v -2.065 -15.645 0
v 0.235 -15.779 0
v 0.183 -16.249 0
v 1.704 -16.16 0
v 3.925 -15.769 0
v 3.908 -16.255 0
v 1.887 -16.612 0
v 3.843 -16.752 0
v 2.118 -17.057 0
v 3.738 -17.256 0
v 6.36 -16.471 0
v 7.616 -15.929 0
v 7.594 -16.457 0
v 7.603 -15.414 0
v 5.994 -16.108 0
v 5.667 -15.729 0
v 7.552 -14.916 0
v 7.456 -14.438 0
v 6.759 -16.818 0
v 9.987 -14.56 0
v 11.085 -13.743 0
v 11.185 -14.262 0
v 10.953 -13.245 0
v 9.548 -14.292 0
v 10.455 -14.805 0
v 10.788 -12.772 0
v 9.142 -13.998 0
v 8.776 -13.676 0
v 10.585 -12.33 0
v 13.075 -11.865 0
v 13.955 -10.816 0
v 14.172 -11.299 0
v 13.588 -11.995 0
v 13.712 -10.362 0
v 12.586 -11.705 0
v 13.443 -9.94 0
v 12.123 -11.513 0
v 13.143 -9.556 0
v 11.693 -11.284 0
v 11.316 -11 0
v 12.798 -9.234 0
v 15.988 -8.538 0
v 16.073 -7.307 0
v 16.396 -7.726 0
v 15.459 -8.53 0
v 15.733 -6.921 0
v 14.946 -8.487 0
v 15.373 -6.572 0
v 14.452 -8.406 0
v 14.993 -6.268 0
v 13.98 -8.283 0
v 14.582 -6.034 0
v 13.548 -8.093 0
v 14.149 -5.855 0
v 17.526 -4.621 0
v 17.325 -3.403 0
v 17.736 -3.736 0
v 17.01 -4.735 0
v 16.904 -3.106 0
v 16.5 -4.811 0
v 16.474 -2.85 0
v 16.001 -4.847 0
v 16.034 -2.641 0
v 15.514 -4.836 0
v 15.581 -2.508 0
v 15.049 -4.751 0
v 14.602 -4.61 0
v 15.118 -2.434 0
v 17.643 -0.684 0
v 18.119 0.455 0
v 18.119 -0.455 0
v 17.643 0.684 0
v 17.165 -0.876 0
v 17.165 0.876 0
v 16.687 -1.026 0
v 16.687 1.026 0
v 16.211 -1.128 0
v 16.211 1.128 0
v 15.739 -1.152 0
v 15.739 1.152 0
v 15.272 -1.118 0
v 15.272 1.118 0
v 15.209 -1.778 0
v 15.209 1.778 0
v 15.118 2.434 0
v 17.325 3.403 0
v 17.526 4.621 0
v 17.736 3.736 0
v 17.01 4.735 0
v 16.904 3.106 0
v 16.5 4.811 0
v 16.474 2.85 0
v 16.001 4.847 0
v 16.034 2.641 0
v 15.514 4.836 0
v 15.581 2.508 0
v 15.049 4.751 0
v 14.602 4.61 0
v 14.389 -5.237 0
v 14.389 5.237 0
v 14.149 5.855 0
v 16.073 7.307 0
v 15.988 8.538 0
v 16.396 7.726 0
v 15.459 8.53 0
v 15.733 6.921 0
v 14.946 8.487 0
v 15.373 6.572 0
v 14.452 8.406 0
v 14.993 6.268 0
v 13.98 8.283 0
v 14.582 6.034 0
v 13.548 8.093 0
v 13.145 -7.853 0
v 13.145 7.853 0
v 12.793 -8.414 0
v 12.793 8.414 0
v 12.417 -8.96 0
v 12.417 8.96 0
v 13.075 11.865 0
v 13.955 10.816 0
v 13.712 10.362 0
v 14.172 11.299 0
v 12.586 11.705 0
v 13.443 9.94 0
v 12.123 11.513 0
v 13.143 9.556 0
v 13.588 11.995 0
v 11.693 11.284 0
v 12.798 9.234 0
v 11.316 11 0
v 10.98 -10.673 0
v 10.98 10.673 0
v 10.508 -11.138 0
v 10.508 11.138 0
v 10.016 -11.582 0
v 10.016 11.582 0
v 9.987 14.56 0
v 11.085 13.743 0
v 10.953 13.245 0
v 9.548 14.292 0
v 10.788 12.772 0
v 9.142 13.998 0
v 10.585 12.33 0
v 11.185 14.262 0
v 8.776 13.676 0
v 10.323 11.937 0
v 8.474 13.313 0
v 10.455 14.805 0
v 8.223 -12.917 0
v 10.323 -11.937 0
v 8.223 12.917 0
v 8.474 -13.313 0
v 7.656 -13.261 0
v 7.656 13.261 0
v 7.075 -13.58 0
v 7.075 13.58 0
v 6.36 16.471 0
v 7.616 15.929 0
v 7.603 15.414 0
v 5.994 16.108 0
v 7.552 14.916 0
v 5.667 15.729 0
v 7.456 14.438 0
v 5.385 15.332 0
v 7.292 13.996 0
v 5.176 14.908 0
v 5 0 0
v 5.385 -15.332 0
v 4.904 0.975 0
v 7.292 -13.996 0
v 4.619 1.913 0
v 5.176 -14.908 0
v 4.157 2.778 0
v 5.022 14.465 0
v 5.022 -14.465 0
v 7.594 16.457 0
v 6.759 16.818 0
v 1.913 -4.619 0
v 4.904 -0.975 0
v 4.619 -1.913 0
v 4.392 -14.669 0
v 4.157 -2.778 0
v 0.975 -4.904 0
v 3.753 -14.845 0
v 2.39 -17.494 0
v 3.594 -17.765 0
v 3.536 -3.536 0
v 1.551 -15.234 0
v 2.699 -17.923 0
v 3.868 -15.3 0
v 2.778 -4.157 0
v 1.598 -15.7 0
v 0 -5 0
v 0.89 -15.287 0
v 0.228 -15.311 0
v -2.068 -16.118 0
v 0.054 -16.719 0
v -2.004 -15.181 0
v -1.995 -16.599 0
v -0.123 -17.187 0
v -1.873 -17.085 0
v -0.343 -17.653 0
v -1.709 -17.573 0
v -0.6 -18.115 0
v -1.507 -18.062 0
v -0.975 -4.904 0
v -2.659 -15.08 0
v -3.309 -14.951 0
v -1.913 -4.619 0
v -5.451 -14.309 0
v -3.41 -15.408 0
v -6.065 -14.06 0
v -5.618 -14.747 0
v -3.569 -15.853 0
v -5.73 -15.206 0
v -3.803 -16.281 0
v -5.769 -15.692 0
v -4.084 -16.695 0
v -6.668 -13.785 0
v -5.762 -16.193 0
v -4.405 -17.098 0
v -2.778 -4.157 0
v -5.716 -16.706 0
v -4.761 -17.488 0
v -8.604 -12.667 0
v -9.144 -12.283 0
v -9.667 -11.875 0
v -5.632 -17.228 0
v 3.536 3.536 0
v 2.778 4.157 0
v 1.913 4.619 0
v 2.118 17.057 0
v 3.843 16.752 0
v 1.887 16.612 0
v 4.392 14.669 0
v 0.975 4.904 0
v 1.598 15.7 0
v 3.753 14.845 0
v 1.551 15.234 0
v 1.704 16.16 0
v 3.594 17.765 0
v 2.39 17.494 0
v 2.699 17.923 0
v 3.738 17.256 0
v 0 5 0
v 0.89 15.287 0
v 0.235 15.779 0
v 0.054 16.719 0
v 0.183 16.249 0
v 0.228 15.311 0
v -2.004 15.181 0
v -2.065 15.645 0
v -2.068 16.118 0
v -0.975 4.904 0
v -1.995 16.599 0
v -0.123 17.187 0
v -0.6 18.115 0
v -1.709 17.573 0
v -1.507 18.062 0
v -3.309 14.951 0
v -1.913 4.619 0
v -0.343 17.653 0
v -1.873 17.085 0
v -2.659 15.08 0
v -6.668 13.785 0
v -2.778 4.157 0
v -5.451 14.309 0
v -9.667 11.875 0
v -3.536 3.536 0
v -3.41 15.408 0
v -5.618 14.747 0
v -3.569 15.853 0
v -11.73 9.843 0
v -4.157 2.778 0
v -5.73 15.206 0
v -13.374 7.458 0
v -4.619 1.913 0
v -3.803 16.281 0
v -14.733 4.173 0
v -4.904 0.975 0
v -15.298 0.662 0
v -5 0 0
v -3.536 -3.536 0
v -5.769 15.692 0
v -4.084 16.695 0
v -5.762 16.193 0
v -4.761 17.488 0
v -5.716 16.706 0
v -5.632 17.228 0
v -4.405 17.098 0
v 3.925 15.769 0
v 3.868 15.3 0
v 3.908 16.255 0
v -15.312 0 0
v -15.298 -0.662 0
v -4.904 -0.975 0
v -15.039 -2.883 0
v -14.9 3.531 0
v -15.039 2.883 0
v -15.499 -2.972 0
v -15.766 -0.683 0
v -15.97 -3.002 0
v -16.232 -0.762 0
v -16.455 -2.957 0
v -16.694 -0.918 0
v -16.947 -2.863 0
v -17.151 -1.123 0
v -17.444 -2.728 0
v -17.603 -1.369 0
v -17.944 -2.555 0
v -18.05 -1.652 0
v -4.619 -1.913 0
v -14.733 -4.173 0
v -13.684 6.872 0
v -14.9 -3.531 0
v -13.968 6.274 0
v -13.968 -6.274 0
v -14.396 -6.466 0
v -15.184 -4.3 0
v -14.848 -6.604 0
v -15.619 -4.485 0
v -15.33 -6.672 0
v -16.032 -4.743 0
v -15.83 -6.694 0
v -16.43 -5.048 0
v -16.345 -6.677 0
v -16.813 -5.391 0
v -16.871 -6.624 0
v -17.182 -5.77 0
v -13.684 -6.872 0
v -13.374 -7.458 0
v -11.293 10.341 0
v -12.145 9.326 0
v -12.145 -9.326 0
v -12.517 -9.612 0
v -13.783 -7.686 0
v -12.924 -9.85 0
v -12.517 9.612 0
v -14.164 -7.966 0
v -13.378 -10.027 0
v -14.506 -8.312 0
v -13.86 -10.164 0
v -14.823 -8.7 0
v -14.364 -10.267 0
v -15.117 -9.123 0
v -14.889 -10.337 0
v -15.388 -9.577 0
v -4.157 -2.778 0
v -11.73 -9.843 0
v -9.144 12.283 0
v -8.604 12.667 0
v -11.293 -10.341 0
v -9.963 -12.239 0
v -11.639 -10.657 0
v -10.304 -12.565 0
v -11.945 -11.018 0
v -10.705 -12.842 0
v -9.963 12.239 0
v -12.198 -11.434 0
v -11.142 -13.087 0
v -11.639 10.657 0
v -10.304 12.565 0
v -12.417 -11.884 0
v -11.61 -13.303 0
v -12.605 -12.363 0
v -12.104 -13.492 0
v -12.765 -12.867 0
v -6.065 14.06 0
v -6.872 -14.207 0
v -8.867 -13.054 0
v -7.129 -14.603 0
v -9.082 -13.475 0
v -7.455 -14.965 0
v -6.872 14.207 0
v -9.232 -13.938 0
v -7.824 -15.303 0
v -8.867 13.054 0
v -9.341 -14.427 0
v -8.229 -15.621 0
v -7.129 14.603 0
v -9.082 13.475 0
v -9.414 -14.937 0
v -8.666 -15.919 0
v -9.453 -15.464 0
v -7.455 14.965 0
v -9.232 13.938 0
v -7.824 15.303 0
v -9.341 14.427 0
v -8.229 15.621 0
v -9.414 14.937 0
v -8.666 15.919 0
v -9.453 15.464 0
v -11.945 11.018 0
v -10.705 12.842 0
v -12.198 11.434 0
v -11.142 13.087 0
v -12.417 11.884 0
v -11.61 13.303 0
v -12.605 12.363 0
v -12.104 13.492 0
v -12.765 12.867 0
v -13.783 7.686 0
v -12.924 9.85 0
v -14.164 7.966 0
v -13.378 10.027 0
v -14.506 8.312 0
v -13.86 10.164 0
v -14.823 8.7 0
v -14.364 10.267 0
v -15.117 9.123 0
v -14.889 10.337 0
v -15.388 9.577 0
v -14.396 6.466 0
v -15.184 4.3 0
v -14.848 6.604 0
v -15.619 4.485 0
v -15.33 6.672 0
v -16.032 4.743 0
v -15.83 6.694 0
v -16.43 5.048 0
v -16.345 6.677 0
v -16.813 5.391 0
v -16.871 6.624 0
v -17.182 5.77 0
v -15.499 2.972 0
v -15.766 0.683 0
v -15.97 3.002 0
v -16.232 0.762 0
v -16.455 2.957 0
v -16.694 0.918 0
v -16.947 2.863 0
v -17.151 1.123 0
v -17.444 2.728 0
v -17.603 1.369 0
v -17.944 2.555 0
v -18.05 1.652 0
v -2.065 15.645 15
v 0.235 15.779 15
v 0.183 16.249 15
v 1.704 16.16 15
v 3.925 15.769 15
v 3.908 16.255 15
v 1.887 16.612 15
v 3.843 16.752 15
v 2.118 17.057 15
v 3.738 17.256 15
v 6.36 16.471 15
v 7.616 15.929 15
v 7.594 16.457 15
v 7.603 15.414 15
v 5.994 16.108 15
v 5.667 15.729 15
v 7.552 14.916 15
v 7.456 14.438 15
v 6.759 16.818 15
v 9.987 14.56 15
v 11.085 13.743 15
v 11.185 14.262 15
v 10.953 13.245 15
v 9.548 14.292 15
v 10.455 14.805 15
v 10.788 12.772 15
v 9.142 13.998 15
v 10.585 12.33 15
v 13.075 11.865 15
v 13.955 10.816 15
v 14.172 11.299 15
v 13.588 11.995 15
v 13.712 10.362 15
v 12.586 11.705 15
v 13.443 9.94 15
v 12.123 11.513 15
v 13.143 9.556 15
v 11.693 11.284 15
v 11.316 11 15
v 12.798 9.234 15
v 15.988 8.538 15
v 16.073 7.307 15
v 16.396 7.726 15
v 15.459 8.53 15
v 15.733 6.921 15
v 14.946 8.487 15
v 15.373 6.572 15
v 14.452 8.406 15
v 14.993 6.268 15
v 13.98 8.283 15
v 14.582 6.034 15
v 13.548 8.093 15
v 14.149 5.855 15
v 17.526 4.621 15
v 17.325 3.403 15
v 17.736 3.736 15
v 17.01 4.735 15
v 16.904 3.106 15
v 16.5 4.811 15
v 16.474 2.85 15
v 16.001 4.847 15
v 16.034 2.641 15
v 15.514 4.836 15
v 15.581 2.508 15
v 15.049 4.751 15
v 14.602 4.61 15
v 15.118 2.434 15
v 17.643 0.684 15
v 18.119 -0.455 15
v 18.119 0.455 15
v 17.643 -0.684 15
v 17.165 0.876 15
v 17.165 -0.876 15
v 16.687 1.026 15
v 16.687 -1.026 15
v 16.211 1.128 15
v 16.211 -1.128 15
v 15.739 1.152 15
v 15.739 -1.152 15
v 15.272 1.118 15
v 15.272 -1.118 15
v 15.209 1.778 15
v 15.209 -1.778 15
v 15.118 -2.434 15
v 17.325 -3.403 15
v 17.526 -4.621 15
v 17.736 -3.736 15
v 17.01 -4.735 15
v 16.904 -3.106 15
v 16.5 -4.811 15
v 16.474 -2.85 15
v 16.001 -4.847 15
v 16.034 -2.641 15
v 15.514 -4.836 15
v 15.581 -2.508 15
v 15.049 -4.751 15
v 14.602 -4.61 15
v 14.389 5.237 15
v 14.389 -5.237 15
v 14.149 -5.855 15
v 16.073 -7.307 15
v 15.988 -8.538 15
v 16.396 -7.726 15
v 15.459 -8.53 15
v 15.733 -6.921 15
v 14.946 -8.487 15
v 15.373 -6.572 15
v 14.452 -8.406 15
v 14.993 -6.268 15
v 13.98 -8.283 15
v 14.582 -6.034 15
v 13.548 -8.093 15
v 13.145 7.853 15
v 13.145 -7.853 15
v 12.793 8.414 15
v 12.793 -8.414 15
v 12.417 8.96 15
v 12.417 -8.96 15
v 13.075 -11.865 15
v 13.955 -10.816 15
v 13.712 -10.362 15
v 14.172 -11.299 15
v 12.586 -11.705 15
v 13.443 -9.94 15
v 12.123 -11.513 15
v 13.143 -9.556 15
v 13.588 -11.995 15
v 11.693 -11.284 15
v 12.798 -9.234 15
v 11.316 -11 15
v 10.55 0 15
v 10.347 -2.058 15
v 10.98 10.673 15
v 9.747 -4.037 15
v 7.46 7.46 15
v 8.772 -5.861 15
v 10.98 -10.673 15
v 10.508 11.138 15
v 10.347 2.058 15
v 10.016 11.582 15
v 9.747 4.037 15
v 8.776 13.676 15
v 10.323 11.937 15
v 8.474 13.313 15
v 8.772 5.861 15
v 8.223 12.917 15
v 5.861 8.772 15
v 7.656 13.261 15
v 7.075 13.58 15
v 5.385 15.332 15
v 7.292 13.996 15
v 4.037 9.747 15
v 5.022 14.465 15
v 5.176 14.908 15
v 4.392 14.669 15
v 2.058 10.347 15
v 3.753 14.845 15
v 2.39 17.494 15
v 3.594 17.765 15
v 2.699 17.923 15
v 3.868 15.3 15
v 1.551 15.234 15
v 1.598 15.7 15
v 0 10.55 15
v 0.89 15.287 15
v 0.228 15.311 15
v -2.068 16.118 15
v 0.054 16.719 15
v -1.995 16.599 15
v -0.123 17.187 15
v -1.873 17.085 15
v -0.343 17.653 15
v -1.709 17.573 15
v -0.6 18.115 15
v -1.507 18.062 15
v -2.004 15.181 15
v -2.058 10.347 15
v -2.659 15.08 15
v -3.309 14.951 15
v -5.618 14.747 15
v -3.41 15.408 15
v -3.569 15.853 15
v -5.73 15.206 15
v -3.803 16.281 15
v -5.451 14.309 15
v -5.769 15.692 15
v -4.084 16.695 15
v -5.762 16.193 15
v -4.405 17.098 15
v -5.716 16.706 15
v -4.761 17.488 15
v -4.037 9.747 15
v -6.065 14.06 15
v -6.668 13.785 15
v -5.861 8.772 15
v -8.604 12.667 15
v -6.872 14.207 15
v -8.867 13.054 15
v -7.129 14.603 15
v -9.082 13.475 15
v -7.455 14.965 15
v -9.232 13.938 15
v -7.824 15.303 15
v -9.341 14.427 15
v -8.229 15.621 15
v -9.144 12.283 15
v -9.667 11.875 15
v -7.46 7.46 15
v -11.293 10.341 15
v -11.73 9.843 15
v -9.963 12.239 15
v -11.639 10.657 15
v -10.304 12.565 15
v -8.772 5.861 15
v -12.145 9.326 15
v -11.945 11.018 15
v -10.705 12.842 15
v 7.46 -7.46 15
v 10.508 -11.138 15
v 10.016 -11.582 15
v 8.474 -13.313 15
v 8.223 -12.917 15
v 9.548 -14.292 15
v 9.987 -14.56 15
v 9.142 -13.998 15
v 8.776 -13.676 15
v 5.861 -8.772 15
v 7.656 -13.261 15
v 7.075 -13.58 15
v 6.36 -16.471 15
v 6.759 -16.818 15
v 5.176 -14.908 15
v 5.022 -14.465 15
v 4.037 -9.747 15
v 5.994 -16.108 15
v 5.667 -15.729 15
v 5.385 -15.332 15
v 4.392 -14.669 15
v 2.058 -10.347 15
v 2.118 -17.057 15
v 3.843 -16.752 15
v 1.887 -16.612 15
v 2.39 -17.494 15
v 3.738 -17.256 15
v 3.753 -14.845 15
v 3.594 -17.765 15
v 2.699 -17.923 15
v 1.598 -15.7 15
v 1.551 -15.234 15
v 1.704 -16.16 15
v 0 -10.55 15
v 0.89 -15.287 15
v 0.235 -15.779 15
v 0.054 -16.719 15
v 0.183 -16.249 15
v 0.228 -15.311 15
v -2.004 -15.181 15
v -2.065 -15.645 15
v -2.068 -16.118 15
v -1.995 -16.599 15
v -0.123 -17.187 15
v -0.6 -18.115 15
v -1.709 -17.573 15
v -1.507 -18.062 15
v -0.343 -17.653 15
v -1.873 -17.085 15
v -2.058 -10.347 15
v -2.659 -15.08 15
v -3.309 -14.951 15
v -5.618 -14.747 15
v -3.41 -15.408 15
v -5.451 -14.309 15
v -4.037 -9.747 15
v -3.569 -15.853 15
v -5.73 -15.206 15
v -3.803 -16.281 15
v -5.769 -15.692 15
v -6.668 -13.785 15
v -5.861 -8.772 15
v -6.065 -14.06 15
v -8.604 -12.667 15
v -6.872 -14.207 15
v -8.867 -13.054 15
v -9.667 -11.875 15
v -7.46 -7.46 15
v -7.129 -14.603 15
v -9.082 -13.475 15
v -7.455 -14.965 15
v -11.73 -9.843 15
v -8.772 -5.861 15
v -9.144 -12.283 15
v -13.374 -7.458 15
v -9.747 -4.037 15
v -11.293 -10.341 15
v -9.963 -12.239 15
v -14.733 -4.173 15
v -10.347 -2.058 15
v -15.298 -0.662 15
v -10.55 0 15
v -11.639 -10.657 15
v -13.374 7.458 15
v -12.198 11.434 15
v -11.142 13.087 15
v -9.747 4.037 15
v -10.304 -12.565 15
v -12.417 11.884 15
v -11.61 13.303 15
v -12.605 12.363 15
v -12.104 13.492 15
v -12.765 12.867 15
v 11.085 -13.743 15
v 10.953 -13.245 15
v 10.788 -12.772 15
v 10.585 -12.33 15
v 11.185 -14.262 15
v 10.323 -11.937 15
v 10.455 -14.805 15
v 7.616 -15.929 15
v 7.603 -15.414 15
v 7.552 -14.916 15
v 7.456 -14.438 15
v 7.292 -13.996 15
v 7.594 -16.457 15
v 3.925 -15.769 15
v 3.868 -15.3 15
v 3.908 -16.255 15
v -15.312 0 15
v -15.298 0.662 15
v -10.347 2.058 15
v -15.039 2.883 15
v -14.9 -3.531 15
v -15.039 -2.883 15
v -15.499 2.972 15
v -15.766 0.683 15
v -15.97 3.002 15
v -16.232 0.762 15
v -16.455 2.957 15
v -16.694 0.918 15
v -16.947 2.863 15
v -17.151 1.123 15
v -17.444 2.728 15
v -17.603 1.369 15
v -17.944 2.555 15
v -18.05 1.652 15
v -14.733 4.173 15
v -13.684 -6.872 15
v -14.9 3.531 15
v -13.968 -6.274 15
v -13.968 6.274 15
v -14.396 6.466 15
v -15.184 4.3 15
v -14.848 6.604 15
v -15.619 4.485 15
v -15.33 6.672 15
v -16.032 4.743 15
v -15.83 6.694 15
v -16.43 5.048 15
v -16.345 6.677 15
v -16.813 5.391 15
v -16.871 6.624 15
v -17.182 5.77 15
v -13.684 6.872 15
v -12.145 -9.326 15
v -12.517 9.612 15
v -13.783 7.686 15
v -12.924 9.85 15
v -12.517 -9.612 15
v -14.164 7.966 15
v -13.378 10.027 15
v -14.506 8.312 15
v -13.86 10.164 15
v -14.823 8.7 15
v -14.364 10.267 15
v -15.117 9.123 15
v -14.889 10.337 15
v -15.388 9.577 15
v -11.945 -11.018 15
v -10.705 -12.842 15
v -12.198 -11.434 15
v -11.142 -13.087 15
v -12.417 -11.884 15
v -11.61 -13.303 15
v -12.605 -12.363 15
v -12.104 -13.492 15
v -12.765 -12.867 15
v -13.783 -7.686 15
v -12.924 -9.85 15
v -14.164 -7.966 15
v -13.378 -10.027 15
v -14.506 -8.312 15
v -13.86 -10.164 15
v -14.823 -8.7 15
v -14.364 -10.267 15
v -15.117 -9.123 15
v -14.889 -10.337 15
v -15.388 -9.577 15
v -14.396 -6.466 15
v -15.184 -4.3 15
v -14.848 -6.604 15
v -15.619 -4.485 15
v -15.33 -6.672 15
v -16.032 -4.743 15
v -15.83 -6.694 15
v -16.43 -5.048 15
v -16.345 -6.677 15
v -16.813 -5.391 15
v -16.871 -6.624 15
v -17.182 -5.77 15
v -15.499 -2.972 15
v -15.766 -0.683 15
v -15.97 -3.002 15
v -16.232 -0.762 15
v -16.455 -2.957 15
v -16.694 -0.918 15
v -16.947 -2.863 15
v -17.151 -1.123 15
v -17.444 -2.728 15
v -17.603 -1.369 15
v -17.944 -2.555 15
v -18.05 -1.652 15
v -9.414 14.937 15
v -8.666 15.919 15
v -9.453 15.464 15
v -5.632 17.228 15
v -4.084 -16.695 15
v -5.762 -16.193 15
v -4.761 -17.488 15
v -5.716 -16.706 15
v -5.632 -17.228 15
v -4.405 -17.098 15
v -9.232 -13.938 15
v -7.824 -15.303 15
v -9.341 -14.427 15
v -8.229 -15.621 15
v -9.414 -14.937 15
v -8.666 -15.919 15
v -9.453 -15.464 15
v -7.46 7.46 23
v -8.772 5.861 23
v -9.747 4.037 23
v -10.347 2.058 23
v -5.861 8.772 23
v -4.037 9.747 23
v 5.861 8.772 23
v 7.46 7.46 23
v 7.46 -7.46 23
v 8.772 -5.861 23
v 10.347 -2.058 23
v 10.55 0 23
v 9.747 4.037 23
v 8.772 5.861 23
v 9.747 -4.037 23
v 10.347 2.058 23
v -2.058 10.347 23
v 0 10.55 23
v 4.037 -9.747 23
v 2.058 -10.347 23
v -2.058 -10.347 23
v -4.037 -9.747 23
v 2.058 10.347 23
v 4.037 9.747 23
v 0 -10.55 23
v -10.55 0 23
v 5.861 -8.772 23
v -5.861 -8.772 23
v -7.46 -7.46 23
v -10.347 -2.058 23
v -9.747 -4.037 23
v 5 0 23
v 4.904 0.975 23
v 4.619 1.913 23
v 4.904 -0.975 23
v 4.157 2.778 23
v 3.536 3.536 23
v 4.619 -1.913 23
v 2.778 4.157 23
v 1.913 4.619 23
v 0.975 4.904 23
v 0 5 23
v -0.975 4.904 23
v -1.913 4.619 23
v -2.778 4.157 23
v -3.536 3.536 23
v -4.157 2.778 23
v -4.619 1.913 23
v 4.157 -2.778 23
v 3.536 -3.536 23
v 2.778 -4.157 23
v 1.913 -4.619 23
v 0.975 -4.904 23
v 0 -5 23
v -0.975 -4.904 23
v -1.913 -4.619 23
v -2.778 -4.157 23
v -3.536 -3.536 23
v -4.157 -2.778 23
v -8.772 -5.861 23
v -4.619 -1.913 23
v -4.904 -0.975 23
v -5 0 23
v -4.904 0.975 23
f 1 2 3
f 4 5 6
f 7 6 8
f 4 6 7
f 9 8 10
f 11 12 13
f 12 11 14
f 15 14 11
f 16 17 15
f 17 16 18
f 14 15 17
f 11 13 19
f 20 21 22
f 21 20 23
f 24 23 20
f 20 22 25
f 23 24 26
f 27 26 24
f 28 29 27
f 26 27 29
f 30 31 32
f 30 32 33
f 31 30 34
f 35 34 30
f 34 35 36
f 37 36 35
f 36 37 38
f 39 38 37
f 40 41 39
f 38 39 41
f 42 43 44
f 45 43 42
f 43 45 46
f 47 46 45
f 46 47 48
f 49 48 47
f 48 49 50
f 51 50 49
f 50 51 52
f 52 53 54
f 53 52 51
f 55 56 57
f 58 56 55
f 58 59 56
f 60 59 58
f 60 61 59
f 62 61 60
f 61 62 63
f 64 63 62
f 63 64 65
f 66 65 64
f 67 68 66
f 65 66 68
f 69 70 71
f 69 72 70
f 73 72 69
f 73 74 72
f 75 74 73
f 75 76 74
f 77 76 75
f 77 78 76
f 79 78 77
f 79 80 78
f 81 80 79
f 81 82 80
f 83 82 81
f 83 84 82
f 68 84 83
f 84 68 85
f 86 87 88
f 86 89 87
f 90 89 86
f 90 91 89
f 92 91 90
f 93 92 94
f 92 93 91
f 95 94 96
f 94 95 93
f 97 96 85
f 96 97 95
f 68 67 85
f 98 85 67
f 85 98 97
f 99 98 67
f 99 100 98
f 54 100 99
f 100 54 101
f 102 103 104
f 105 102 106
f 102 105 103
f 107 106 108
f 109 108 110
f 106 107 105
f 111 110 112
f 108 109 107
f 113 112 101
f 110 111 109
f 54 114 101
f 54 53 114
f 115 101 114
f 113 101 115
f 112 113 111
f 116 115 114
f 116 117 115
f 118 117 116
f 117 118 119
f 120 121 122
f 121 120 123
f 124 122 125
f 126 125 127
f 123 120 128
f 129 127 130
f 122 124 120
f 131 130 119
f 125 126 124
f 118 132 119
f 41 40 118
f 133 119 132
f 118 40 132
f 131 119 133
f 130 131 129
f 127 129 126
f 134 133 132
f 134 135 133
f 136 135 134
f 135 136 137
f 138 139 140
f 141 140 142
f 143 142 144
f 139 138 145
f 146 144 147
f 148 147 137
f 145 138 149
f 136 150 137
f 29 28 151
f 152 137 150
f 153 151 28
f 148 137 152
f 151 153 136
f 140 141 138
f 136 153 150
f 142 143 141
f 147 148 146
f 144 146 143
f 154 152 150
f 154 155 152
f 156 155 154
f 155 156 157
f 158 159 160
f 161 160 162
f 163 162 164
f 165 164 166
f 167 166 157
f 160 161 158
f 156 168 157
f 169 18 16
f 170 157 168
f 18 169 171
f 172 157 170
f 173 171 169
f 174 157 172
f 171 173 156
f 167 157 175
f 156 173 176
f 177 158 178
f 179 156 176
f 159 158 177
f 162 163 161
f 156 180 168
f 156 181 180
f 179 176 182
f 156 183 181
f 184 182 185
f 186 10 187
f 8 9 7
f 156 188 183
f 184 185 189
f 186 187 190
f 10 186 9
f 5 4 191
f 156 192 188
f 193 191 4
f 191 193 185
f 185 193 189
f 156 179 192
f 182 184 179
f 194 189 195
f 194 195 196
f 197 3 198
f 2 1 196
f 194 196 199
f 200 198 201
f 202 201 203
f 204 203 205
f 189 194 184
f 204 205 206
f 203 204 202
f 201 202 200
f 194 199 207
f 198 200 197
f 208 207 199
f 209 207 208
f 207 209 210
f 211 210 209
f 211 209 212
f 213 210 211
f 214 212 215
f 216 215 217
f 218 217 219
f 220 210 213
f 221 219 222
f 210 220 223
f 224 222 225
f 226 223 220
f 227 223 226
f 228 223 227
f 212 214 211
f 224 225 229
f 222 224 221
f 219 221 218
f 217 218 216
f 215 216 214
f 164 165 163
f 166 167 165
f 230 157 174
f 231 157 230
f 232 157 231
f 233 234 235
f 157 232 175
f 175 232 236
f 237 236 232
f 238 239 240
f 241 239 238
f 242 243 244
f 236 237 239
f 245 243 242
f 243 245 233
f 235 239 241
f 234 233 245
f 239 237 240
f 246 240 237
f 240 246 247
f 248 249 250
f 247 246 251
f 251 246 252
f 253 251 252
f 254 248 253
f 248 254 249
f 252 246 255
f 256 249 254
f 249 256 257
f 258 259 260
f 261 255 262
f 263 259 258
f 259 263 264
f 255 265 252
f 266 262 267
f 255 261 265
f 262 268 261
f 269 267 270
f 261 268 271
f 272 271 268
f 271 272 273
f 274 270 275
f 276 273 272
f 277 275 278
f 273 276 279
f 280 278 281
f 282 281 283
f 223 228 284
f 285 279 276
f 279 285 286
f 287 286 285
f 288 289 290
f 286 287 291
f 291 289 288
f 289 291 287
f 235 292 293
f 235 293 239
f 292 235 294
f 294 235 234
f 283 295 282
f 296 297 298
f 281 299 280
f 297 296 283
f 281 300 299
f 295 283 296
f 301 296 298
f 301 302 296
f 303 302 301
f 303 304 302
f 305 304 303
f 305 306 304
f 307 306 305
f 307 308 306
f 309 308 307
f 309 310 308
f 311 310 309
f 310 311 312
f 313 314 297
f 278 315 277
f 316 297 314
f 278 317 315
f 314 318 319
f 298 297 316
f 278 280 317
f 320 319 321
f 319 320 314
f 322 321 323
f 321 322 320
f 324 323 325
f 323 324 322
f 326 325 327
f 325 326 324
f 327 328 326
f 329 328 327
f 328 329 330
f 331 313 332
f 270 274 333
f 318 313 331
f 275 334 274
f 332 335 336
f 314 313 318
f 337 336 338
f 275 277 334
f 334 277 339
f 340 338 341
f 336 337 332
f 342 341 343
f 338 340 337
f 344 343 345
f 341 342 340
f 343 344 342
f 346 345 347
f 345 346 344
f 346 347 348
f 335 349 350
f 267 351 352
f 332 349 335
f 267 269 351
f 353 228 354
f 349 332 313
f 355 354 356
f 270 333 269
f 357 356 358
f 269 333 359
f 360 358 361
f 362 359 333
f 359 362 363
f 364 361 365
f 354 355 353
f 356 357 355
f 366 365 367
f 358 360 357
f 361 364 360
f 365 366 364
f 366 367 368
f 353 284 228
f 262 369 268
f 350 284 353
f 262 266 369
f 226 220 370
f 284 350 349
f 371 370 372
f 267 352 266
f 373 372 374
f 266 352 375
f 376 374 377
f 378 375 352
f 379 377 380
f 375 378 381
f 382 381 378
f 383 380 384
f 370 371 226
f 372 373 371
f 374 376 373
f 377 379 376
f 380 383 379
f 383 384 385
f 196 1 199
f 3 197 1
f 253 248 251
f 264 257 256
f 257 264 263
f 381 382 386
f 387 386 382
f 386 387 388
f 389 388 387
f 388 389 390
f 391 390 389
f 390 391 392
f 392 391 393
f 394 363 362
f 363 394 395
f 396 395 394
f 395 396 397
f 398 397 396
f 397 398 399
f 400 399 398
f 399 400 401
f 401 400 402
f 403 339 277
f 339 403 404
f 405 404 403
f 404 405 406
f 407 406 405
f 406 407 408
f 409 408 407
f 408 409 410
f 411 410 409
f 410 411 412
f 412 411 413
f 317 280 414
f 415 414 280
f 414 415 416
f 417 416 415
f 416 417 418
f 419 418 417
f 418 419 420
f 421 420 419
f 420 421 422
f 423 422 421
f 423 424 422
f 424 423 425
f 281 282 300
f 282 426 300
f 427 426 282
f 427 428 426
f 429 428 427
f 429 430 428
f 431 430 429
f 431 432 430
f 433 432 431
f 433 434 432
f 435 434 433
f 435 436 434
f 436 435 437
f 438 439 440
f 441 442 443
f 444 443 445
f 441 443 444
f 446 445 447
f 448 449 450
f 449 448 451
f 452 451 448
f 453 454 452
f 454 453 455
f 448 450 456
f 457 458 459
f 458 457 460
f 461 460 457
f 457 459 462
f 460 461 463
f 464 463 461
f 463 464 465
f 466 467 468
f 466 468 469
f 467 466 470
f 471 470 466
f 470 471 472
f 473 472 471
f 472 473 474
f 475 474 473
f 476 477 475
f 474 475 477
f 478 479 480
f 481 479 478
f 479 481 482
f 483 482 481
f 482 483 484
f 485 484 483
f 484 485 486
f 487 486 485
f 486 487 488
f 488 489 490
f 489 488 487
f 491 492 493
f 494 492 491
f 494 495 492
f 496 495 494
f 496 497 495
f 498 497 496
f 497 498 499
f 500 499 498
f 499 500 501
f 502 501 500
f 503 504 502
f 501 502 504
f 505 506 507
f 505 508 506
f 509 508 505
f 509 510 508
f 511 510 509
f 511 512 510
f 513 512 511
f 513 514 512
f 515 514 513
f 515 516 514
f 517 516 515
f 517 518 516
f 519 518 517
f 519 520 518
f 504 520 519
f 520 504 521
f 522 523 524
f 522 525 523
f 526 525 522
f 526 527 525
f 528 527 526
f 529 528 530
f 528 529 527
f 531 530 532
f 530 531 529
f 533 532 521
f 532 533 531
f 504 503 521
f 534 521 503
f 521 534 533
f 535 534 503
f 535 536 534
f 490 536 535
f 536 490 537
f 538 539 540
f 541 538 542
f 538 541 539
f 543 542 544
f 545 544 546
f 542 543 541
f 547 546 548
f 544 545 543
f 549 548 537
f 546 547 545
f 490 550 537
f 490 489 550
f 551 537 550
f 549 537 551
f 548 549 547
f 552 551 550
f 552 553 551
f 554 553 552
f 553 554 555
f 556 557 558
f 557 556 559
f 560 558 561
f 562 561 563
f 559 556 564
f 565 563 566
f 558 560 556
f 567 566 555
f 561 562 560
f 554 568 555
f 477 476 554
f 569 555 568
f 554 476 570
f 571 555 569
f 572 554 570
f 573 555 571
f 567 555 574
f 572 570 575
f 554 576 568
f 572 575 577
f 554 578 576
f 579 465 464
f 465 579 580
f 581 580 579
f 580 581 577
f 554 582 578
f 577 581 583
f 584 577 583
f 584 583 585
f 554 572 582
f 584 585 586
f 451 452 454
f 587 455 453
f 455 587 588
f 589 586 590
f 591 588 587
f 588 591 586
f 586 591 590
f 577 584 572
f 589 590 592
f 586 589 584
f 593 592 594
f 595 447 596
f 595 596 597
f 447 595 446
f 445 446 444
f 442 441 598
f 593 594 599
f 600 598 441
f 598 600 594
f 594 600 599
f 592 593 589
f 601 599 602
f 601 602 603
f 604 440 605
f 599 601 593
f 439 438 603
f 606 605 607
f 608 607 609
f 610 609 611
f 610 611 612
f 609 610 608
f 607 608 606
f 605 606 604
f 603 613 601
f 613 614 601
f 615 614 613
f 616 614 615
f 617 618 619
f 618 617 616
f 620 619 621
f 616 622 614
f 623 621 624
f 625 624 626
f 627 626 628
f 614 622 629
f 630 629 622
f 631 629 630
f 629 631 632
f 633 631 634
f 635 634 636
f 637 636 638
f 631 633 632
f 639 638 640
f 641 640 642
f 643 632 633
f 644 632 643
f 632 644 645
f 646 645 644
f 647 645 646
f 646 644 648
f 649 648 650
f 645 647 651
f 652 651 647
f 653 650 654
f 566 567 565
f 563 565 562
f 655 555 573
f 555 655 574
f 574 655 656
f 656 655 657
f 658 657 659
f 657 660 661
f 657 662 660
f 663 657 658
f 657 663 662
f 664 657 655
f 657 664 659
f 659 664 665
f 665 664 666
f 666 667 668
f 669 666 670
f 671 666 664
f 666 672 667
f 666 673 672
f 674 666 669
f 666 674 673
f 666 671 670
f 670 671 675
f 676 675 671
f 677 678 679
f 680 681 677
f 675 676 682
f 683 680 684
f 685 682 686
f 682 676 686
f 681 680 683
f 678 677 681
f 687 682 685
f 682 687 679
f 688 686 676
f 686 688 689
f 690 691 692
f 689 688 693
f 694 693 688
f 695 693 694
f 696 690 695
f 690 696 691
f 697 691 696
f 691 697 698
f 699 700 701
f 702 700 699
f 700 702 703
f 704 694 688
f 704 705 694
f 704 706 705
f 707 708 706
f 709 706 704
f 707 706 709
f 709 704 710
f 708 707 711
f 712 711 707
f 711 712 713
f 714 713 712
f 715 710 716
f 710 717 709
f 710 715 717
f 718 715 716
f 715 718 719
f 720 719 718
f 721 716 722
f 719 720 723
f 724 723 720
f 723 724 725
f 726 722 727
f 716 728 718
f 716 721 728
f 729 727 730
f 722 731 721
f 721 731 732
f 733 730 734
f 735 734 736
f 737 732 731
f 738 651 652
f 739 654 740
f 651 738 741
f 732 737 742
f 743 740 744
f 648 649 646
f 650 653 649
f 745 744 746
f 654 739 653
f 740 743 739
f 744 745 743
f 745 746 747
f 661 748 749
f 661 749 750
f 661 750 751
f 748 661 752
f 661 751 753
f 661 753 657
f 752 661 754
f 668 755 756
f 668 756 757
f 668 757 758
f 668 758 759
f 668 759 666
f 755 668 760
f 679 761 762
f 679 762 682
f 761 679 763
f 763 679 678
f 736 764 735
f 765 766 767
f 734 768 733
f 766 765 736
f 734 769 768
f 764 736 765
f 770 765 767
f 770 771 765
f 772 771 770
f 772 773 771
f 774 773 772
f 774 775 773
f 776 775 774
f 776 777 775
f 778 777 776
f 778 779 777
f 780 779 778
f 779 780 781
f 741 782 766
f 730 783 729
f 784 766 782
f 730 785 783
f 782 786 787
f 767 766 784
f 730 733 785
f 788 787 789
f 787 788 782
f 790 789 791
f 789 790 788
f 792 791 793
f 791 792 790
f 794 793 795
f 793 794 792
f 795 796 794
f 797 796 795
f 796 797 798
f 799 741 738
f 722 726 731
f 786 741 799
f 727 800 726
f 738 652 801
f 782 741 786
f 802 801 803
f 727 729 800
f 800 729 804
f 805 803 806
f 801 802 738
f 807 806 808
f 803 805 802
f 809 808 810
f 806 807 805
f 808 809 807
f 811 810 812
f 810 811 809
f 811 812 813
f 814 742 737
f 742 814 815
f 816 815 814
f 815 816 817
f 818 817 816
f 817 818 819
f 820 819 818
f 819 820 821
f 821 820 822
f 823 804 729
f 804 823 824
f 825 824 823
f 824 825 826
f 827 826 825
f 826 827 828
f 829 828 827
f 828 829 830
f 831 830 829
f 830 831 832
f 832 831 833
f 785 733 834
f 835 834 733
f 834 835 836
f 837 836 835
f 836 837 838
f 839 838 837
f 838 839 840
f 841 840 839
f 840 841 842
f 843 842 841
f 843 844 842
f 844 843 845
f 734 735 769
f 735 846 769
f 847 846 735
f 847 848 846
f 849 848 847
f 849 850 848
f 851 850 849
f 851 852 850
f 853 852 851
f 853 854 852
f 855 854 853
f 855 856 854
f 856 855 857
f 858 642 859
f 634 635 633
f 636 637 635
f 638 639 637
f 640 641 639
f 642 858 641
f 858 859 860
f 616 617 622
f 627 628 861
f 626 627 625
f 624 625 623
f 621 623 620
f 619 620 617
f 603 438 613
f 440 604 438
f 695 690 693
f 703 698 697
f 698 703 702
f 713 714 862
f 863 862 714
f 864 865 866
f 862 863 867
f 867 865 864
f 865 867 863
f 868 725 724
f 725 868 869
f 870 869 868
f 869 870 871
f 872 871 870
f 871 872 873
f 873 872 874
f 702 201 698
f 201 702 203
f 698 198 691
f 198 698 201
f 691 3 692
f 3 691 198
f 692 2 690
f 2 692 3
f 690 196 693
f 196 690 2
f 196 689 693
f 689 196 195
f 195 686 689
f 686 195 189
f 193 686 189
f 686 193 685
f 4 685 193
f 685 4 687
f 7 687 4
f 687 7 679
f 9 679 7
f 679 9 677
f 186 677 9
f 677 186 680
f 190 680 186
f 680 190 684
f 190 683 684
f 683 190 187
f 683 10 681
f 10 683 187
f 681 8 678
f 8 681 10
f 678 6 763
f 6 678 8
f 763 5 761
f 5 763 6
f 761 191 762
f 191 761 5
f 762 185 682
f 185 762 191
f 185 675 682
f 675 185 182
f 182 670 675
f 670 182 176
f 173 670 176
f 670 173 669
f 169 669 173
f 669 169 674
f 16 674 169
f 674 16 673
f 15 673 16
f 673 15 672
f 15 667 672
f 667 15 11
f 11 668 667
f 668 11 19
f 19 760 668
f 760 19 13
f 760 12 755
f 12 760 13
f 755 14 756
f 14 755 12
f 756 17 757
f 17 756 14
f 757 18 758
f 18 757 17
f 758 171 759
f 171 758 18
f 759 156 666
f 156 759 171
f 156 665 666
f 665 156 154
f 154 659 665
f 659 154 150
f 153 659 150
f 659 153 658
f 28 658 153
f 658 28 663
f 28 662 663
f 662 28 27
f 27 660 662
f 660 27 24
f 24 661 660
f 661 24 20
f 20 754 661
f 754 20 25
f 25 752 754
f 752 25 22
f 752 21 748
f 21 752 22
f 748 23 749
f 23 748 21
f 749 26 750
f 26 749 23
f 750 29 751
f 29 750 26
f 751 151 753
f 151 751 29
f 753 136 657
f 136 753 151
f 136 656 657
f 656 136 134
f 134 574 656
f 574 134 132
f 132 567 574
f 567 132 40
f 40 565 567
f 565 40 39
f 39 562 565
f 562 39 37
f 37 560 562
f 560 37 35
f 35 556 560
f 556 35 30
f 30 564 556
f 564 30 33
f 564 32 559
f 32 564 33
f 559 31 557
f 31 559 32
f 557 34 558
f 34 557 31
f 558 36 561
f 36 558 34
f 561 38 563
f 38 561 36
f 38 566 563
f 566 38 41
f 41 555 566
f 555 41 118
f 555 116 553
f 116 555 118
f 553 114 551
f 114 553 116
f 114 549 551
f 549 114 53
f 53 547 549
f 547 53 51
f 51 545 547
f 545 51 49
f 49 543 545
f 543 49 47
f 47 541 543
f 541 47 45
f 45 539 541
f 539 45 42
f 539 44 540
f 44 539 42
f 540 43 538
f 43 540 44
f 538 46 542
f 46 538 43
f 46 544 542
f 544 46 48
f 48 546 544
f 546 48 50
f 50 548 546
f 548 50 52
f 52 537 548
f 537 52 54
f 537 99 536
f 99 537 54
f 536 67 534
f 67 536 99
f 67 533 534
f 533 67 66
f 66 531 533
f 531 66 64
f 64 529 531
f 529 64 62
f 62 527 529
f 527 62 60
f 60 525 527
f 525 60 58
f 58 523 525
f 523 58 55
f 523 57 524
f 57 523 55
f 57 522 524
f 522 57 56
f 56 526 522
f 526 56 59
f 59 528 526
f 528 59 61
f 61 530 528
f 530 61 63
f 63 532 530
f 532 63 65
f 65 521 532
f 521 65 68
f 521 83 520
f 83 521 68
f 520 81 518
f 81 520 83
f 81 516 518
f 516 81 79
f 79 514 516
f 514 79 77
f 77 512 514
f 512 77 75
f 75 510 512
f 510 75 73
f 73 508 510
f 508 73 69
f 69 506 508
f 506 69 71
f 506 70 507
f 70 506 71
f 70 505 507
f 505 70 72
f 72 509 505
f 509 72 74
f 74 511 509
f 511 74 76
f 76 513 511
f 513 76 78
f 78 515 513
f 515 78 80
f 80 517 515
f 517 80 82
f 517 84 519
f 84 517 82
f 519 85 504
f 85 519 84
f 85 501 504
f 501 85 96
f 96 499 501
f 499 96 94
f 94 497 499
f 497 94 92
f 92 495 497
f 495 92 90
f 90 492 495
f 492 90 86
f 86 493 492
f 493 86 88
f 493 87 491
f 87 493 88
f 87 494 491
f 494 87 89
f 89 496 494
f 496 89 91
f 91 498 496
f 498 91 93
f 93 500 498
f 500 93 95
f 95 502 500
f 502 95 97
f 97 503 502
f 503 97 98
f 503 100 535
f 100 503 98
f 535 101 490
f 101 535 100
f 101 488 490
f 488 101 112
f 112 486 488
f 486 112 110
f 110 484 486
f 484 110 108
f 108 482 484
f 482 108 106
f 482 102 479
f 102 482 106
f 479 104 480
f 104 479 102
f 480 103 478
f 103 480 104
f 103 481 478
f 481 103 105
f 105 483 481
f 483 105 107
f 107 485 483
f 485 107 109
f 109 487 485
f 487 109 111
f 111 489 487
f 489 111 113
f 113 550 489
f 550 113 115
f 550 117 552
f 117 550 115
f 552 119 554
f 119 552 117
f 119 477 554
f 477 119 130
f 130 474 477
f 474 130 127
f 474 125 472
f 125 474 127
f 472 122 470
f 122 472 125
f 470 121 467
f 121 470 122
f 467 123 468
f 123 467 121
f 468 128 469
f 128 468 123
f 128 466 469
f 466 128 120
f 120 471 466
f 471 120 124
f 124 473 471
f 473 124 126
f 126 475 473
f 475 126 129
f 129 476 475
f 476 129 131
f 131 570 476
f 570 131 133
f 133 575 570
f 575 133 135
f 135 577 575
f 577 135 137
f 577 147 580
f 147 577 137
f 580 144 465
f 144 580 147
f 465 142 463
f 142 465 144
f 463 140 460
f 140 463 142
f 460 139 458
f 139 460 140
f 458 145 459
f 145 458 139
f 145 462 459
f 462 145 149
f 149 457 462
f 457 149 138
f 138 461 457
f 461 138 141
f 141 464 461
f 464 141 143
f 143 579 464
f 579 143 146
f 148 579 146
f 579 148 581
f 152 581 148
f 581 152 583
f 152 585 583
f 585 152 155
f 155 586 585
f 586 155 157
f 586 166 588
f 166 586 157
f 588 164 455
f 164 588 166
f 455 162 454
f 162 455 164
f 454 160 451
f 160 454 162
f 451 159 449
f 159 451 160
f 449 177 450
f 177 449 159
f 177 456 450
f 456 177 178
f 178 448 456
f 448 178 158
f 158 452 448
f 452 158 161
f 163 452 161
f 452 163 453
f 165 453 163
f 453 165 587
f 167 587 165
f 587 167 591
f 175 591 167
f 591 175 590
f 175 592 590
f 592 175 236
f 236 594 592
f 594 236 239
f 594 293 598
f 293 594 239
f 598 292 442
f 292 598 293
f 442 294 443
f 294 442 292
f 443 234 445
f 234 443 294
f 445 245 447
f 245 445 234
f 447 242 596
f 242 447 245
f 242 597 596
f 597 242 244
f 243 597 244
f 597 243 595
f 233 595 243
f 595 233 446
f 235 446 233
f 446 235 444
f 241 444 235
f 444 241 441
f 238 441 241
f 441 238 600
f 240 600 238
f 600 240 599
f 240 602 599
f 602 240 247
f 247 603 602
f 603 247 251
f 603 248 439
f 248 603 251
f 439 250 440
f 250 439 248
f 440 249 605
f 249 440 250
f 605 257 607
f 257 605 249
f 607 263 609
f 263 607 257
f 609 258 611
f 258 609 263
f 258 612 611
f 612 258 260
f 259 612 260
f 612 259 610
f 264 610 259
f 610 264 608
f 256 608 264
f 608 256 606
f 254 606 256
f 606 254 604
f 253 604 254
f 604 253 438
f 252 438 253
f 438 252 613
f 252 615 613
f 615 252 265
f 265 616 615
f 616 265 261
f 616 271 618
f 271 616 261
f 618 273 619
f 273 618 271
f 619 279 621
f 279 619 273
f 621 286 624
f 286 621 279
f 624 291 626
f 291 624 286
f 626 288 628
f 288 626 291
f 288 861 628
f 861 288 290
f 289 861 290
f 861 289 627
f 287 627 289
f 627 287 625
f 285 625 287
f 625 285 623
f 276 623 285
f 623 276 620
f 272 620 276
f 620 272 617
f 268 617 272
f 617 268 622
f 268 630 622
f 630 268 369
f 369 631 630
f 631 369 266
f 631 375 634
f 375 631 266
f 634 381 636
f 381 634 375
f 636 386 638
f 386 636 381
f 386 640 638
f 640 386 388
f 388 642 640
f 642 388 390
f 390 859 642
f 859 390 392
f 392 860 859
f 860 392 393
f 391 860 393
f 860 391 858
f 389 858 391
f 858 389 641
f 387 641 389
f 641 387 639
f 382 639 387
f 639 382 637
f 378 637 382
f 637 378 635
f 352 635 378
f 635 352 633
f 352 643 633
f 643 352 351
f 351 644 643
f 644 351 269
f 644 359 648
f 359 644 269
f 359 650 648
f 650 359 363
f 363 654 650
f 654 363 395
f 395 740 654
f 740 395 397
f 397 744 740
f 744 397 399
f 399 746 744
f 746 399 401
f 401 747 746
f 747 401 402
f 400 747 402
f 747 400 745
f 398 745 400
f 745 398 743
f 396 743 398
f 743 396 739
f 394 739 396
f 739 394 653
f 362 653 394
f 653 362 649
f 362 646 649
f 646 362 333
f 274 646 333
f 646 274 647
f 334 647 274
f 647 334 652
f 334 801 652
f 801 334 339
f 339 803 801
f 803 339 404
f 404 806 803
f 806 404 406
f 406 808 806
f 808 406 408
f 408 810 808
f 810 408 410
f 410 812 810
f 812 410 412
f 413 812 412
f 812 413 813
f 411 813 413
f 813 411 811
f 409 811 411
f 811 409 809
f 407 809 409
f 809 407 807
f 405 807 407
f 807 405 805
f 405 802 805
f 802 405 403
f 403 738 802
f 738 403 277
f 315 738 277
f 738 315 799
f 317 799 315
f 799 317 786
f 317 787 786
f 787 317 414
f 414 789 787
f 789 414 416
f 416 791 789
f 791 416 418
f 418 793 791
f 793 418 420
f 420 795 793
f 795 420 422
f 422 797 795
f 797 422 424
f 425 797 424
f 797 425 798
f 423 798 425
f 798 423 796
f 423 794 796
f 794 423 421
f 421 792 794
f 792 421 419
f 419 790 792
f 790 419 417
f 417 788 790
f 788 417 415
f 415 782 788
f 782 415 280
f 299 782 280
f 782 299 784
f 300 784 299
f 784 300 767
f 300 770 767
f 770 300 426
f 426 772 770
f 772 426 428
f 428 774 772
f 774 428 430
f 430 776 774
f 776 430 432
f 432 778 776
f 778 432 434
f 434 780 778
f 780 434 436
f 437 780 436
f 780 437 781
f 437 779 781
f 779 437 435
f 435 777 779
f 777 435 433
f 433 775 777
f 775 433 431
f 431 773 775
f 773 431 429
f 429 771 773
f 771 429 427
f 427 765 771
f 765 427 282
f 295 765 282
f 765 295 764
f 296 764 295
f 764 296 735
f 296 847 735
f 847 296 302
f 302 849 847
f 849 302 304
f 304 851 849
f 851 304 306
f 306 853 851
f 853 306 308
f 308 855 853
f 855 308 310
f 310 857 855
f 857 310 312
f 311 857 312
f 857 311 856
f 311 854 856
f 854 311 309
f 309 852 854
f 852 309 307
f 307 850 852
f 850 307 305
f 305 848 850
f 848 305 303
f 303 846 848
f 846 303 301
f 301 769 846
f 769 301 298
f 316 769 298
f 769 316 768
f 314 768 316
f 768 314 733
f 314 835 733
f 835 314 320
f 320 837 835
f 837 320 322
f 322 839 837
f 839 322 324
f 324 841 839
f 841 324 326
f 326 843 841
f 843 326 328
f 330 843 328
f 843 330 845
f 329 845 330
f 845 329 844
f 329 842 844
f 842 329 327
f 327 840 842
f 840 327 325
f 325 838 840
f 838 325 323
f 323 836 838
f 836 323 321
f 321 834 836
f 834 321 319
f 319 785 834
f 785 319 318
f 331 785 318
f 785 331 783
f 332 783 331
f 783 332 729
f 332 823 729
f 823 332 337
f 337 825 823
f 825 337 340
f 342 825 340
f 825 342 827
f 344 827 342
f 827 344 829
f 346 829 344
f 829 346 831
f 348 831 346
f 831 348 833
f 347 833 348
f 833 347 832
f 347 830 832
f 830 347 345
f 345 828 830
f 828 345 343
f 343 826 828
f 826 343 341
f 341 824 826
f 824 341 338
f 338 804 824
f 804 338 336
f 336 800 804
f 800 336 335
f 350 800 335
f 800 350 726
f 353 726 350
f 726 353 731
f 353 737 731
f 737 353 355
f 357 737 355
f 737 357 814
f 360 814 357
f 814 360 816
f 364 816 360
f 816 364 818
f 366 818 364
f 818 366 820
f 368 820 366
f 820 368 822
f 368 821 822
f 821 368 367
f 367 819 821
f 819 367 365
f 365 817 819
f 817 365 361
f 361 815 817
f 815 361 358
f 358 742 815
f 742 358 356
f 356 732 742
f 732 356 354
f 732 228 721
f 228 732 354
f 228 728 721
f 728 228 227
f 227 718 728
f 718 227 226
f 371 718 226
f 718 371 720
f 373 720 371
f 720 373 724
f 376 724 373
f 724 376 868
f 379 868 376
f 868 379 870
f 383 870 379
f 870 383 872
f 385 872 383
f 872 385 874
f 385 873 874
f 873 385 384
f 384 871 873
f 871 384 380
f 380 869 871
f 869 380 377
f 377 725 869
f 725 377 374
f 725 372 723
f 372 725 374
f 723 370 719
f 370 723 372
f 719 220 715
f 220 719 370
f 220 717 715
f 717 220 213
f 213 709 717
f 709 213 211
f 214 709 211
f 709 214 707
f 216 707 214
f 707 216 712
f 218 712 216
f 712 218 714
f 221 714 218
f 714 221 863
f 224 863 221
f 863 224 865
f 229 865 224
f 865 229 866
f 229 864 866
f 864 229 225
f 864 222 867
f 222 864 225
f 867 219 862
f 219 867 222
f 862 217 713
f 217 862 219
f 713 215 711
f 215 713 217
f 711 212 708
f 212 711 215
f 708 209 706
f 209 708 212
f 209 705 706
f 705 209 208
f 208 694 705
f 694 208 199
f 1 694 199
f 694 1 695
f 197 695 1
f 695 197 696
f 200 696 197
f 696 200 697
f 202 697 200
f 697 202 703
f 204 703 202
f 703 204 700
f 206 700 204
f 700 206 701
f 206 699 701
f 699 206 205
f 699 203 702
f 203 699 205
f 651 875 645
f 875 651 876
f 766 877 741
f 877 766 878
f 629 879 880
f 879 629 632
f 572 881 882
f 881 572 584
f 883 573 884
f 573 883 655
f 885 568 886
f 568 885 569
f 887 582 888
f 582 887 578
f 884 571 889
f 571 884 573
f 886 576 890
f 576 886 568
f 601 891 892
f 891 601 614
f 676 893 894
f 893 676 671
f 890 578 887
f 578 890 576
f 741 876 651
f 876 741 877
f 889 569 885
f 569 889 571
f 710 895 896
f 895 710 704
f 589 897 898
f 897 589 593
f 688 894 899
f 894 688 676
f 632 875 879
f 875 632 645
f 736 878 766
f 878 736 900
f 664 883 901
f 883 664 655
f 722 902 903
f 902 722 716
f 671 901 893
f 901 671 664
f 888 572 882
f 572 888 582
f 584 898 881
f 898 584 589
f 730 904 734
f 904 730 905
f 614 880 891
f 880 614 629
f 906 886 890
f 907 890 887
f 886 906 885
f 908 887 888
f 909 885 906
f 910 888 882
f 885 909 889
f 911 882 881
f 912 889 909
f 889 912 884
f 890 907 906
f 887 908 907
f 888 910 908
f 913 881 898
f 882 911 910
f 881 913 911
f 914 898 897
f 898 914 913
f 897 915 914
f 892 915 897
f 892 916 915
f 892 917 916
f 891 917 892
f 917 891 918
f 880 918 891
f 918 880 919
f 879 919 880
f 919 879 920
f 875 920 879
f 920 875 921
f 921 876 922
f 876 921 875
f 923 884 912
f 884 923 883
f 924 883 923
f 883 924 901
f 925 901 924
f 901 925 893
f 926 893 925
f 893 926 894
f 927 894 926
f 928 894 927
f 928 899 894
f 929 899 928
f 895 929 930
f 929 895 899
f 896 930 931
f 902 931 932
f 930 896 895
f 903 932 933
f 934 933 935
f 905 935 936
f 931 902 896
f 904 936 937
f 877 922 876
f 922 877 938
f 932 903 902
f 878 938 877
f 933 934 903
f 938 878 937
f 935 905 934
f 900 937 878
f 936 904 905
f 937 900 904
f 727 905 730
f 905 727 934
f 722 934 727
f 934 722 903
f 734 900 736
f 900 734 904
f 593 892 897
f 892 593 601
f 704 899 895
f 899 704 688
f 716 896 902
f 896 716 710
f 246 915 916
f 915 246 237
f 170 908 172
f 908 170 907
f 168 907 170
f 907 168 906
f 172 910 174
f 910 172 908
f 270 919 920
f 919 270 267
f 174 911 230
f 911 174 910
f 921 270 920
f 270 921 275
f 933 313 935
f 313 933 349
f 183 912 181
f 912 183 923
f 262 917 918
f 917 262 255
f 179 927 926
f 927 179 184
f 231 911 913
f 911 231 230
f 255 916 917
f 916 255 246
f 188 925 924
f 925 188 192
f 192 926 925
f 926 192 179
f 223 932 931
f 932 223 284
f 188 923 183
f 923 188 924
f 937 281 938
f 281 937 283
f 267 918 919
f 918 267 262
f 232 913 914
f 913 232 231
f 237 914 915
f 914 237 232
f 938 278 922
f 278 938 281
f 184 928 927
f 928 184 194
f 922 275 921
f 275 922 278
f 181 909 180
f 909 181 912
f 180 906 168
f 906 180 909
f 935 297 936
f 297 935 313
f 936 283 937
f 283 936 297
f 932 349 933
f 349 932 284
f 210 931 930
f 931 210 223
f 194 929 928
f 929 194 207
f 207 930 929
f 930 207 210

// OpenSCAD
$fn = 32;

// ----------------------------------------------------------------------
// Spur gear: m=1.25 z=27, 36.25 mm tip diameter x 23 mm
// ----------------------------------------------------------------------

// --- parameters (mm) ---
gear_module = 1.25;       // module
tooth_count = 27;         // number of teeth
gear_w = 15;              // face width
pa = 20;                  // pressure angle, deg
bore = 10;                // shaft bore
hub_dia = 21.1;           // hub diameter
hub_len = 8;              // hub above the face

/* --- involute profile --- */
pitch_r = gear_module * tooth_count / 2;
base_r = pitch_r * cos(pa);
tip_r = pitch_r + gear_module;
root_r = pitch_r - 1.25 * gear_module;
flank_steps = 6;

function inv_deg(a) = (tan(a) - a * PI / 180) * 180 / PI;
function flank_r(i) = root_r + (tip_r - root_r) * i / flank_steps;
function half_angle(r) = 90 / tooth_count + inv_deg(pa) - inv_deg(acos(min(1, base_r / r)));
function tooth_pt(k, i, side) =
    let (r = flank_r(i), a = k * 360 / tooth_count + side * half_angle(r))
    [r * cos(a), r * sin(a)];

module tooth_profile() {
  polygon(points = [
    for (k = [0 : tooth_count - 1])
      each [
        for (i = [0 : flank_steps]) tooth_pt(k, i, -1),
        for (i = [flank_steps : -1 : 0]) tooth_pt(k, i, 1),
        let (ta = (k + 0.5) * 360 / tooth_count)
          [root_r * cos(ta), root_r * sin(ta)]
      ]
  ]);
}

module gear_disc() {
  linear_extrude(height = gear_w) tooth_profile();
}

module hub_boss() {
  translate([0, 0, gear_w - 1]) cylinder(h = hub_len + 1, d = hub_dia);
}

difference() {
  union() {
    gear_disc();
    hub_boss();
  }
  translate([0, 0, -1]) cylinder(h = gear_w + hub_len + 3, d = bore);
}
